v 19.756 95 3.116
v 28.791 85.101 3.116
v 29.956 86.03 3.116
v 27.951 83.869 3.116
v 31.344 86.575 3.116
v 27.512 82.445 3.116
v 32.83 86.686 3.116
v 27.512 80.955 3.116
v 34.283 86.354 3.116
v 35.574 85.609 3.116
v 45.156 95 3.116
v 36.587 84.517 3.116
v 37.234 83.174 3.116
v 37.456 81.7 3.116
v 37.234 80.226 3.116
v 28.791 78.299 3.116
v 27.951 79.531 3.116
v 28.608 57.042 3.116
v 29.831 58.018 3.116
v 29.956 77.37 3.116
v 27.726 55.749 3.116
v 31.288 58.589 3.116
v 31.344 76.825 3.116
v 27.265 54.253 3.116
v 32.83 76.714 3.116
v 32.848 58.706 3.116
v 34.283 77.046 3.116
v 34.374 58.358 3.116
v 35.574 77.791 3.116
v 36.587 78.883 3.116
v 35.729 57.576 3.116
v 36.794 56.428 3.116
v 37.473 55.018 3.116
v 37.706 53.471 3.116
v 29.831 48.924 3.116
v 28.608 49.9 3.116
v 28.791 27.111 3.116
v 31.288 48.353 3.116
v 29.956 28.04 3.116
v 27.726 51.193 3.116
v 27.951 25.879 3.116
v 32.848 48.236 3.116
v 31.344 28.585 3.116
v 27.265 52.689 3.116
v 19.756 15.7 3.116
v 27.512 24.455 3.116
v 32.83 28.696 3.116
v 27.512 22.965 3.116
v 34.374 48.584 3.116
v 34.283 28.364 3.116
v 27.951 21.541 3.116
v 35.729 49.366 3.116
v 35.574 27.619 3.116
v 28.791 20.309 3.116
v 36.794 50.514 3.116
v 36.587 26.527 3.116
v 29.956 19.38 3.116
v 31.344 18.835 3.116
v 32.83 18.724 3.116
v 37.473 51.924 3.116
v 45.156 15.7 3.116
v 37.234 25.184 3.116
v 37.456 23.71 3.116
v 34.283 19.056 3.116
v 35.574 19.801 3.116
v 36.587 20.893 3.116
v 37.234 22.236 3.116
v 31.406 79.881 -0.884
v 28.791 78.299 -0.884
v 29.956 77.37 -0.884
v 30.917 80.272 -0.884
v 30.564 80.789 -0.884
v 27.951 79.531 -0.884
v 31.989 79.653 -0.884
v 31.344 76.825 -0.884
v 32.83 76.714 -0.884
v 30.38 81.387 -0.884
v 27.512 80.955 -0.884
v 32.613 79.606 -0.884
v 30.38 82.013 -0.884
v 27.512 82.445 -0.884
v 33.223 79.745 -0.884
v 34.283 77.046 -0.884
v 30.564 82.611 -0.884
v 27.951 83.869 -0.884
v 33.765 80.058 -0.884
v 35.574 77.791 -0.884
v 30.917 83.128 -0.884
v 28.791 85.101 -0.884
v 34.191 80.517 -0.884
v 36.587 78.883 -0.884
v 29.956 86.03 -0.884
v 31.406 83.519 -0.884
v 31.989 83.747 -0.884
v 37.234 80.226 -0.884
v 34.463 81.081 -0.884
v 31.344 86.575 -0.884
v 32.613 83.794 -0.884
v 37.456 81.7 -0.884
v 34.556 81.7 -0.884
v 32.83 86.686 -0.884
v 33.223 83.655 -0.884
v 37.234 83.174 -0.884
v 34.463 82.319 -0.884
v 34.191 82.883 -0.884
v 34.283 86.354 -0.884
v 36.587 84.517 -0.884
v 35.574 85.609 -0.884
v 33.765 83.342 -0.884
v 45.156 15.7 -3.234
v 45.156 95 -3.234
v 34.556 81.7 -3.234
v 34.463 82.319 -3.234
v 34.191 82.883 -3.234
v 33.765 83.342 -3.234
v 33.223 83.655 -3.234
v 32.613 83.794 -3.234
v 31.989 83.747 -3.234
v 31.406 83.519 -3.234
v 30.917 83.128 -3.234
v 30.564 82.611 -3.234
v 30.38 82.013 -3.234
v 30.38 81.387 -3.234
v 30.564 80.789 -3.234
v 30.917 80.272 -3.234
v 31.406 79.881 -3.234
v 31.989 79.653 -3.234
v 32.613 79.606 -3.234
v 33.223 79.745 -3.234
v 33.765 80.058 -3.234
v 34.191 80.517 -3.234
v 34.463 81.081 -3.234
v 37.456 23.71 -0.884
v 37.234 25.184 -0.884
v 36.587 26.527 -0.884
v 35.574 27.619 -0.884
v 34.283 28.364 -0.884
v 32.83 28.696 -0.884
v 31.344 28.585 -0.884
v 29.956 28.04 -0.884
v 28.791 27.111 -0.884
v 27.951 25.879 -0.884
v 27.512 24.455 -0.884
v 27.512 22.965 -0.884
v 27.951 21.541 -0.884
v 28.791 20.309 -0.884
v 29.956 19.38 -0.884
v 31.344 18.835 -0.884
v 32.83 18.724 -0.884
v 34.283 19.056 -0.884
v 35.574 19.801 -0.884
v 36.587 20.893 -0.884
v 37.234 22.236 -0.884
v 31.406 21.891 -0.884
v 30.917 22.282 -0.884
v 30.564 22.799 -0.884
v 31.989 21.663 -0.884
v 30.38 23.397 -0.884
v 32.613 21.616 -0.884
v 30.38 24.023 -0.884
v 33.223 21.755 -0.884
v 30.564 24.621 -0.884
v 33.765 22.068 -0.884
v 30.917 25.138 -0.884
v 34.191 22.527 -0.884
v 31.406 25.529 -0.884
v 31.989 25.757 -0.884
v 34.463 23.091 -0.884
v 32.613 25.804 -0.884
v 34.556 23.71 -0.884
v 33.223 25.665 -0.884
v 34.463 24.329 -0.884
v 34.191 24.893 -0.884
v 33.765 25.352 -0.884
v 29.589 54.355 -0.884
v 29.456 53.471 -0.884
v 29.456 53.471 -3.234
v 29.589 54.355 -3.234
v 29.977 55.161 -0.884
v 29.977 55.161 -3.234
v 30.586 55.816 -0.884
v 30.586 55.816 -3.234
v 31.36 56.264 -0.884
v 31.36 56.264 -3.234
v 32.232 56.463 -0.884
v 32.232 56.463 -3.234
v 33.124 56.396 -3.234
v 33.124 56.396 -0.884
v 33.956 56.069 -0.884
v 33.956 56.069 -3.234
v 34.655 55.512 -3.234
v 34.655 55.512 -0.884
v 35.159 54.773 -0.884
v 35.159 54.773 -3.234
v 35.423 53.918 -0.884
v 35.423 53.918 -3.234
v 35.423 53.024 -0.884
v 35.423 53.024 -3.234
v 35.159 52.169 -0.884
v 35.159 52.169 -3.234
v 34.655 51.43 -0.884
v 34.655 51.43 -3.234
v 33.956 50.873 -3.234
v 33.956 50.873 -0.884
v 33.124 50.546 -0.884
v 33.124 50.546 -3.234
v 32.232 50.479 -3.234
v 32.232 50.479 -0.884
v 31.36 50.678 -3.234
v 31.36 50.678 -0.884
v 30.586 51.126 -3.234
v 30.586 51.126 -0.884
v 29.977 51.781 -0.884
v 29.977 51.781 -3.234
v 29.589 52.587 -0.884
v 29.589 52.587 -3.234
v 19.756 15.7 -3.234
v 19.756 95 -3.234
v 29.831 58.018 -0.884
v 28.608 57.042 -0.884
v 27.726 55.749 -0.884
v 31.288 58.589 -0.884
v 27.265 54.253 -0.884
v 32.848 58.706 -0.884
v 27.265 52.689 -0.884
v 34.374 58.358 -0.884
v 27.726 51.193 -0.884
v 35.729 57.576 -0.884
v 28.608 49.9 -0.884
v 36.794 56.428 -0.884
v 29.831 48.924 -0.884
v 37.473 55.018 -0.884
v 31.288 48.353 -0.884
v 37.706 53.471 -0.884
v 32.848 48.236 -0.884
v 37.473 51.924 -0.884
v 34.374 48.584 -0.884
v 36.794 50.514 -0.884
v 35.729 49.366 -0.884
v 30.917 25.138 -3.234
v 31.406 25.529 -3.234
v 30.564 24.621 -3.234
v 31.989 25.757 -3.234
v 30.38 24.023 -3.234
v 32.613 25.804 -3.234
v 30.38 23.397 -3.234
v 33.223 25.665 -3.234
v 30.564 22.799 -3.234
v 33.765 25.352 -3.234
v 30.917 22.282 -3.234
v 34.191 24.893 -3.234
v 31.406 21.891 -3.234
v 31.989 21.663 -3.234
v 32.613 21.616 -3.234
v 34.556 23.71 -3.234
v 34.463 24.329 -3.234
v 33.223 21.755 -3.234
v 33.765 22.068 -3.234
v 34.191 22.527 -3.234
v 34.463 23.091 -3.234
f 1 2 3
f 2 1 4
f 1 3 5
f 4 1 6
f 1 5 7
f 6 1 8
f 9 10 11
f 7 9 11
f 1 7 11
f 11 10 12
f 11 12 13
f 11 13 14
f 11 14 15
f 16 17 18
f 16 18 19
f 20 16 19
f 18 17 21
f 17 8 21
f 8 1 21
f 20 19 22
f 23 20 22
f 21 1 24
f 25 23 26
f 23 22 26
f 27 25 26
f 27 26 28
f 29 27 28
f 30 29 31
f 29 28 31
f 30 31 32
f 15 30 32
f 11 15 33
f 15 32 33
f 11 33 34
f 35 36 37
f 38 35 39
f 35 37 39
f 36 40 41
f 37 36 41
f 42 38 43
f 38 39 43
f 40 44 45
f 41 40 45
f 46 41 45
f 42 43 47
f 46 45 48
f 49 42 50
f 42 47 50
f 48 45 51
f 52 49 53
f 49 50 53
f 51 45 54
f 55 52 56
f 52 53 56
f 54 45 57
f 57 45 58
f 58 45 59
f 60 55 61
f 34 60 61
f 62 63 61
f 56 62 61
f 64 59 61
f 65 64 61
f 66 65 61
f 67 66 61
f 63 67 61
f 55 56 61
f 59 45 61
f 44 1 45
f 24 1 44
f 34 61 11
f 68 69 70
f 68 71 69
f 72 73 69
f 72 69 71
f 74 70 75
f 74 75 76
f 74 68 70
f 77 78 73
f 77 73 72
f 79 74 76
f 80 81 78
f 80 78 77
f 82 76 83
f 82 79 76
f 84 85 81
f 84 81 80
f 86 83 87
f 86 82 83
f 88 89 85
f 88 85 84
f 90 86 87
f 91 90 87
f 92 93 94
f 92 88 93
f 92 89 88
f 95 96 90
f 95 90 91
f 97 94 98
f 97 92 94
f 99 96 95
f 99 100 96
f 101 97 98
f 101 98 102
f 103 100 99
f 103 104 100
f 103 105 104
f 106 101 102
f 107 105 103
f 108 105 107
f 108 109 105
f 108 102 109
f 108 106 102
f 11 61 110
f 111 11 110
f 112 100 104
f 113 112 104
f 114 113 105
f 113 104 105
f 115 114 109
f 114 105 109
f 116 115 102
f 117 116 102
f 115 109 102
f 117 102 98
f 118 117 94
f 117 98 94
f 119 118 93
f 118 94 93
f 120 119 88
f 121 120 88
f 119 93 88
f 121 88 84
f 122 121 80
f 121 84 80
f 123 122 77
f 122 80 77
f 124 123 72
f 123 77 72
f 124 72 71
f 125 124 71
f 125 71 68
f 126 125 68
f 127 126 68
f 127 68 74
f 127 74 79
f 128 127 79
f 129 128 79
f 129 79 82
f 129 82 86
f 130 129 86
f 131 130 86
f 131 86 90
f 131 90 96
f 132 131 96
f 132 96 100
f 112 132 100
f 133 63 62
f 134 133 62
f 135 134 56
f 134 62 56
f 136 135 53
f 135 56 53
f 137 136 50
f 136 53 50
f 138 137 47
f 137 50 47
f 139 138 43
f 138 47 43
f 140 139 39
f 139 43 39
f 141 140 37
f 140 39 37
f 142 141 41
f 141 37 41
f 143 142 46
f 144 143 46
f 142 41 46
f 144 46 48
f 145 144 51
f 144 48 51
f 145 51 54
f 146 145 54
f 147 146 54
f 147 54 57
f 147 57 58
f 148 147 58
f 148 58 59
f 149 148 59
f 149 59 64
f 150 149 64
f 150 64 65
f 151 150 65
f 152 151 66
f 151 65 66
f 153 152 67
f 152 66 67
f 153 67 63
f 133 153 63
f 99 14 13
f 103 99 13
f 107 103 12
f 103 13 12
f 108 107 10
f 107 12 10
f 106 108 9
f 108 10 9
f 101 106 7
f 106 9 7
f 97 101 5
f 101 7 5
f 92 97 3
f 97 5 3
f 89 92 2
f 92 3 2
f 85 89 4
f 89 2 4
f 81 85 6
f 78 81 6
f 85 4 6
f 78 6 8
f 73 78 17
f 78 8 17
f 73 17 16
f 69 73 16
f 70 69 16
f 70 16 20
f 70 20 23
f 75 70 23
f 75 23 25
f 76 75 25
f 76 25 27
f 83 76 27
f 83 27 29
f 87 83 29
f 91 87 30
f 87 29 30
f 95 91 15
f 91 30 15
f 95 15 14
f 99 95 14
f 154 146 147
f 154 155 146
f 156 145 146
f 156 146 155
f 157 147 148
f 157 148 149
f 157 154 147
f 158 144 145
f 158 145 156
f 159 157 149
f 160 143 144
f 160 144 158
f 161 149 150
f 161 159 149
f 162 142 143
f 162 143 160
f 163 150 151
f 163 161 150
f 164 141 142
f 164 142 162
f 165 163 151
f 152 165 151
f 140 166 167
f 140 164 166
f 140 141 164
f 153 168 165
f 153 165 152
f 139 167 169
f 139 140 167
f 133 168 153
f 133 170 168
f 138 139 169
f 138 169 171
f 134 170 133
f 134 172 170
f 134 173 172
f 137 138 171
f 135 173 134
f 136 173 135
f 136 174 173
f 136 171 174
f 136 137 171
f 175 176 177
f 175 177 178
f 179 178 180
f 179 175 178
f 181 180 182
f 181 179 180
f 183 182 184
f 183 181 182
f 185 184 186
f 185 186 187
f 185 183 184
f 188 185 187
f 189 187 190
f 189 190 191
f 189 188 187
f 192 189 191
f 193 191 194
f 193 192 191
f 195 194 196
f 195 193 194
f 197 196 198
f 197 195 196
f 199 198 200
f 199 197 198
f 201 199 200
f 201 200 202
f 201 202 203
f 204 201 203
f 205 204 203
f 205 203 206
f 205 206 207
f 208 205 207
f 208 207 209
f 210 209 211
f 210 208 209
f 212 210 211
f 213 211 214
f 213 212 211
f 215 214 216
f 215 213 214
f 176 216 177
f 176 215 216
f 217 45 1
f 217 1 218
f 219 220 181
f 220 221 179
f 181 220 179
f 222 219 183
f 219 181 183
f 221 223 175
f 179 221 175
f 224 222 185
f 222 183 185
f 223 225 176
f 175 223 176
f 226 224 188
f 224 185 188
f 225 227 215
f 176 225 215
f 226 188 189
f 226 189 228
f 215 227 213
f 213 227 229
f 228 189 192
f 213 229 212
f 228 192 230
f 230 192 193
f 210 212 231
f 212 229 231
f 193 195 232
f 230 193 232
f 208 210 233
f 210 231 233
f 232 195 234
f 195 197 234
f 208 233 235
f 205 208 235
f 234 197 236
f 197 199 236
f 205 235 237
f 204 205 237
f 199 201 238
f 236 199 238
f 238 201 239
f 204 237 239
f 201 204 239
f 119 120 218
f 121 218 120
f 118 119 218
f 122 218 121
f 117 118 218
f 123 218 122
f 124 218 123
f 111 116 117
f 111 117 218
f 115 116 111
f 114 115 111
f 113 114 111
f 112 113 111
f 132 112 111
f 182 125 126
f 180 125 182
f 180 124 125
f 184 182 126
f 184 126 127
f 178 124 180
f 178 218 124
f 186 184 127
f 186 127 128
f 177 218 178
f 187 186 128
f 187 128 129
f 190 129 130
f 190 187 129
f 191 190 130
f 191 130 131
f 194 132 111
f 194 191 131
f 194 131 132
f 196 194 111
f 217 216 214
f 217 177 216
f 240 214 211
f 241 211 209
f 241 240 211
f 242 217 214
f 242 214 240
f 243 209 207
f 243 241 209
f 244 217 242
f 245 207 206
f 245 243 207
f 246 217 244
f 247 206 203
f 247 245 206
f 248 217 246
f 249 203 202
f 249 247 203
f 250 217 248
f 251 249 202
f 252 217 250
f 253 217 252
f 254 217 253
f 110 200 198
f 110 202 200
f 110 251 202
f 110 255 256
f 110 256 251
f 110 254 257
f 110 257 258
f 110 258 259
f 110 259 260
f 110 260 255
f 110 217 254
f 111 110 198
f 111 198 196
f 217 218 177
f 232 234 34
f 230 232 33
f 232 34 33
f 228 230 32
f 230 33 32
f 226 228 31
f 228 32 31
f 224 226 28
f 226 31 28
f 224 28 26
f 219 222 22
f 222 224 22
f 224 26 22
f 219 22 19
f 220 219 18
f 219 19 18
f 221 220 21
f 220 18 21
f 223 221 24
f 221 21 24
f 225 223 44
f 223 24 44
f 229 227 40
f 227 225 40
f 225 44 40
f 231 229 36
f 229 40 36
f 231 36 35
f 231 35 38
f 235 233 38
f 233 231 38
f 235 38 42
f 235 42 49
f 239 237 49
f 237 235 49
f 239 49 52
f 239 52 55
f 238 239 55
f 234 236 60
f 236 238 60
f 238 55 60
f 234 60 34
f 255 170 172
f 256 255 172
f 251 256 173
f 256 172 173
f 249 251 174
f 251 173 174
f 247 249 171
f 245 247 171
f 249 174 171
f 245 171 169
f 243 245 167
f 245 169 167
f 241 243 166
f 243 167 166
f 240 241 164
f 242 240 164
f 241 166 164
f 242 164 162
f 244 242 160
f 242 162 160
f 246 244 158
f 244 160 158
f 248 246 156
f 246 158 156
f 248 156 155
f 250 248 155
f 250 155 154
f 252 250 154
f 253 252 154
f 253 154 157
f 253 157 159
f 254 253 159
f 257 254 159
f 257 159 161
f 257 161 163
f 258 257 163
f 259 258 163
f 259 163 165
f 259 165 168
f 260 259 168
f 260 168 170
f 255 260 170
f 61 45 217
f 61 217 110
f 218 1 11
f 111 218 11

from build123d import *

# Parameters (mm, degrees)
SKETCH1_W           = 25.4
SKETCH1_H           = 6.35
BOSS_EXTRUDE1_DEPTH = 100
SKETCH2_R           = 2.1
CUT_EXTRUDE1_DEPTH  = 110.906322202
SKETCH2_3_R         = 5
CUT_EXTRUDE2_DEPTH  = 4
SKETCH2_4_R         = 5
CUT_EXTRUDE3_DEPTH  = 4
SKETCH5_W           = 25.4
SKETCH5_H           = 5
SKETCH5_H_2         = 12
CUT_EXTRUDE4_DEPTH  = 110.906322202
SKETCH6_R           = 5.25
CUT_EXTRUDE5_DEPTH  = 106.377415322
SKETCH7_W           = 25.4
SKETCH7_H           = 3.7
CUT_EXTRUDE6_DEPTH  = 106.377415322
BOSS_EXTRUDE2_START = -2.35
SKETCH8_R           = 5.25
SKETCH8_R_2         = 3
BOSS_EXTRUDE2_DEPTH = 2.35


with BuildPart() as part:
    # Sketch1 → Boss-Extrude1 (new body)
    with BuildSketch(Plane(origin=(0, 0, 0), x_dir=(1, 0, 0), z_dir=(0, 1, 0))):
        with Locations((32.456141995, 0.058688594)):
            Rectangle(SKETCH1_W, SKETCH1_H)
    extrude(amount=BOSS_EXTRUDE1_DEPTH)

    # Sketch2 → Cut-Extrude1 (cut, through all)
    with BuildSketch(Plane.XY.offset(3.116311406)):
        with Locations((32.456141995, 81.7)):
            Circle(SKETCH2_R)
        with Locations((32.456141995, 23.71)):
            Circle(SKETCH2_R)
    extrude(amount=-CUT_EXTRUDE1_DEPTH, mode=Mode.SUBTRACT)

    # Sketch2<3> → Cut-Extrude2 (cut)
    with BuildSketch(Plane.XY.offset(3.116311406)):
        with Locations((32.456141995, 81.7)):
            Circle(SKETCH2_3_R)
    extrude(amount=-CUT_EXTRUDE2_DEPTH, mode=Mode.SUBTRACT)

    # Sketch2<4> → Cut-Extrude3 (cut)
    with BuildSketch(Plane.XY.offset(3.116311406)):
        with Locations((32.456141995, 23.71)):
            Circle(SKETCH2_4_R)
    extrude(amount=-CUT_EXTRUDE3_DEPTH, mode=Mode.SUBTRACT)

    # Sketch5 → Cut-Extrude4 (cut, through all)
    with BuildSketch(Plane.XY.offset(3.116311406)):
        with Locations((32.456141995, 97.5)):
            Rectangle(SKETCH5_W, SKETCH5_H)
        with Locations((32.456141995, 6)):
            Rectangle(SKETCH5_W, SKETCH5_H_2)
    extrude(amount=-CUT_EXTRUDE4_DEPTH, mode=Mode.SUBTRACT)

    # Sketch6 → Cut-Extrude5 (cut, through all)
    with BuildSketch(Plane.XY.offset(3.116311406)):
        with Locations((32.456141995, 53.471)):
            Circle(SKETCH6_R)
    extrude(amount=-CUT_EXTRUDE5_DEPTH, mode=Mode.SUBTRACT)

    # Sketch7 → Cut-Extrude6 (cut, through all)
    with BuildSketch(Plane.XY.offset(3.116311406)):
        with Locations((32.456141995, 13.85)):
            Rectangle(SKETCH7_W, SKETCH7_H)
    extrude(amount=-CUT_EXTRUDE6_DEPTH, mode=Mode.SUBTRACT)

    # Sketch8 → Boss-Extrude2 (add)
    with BuildSketch(Plane(origin=(0, 0, -3.233688594), x_dir=(-1, 0, 0), z_dir=(0, 0, -1)).offset(BOSS_EXTRUDE2_START)):
        with Locations((-32.456141995, 53.471)):
            Circle(SKETCH8_R)
        with Locations((-32.456141995, 53.471)):
            Circle(SKETCH8_R_2, mode=Mode.SUBTRACT)
    extrude(amount=BOSS_EXTRUDE2_DEPTH)


solid = part.part
